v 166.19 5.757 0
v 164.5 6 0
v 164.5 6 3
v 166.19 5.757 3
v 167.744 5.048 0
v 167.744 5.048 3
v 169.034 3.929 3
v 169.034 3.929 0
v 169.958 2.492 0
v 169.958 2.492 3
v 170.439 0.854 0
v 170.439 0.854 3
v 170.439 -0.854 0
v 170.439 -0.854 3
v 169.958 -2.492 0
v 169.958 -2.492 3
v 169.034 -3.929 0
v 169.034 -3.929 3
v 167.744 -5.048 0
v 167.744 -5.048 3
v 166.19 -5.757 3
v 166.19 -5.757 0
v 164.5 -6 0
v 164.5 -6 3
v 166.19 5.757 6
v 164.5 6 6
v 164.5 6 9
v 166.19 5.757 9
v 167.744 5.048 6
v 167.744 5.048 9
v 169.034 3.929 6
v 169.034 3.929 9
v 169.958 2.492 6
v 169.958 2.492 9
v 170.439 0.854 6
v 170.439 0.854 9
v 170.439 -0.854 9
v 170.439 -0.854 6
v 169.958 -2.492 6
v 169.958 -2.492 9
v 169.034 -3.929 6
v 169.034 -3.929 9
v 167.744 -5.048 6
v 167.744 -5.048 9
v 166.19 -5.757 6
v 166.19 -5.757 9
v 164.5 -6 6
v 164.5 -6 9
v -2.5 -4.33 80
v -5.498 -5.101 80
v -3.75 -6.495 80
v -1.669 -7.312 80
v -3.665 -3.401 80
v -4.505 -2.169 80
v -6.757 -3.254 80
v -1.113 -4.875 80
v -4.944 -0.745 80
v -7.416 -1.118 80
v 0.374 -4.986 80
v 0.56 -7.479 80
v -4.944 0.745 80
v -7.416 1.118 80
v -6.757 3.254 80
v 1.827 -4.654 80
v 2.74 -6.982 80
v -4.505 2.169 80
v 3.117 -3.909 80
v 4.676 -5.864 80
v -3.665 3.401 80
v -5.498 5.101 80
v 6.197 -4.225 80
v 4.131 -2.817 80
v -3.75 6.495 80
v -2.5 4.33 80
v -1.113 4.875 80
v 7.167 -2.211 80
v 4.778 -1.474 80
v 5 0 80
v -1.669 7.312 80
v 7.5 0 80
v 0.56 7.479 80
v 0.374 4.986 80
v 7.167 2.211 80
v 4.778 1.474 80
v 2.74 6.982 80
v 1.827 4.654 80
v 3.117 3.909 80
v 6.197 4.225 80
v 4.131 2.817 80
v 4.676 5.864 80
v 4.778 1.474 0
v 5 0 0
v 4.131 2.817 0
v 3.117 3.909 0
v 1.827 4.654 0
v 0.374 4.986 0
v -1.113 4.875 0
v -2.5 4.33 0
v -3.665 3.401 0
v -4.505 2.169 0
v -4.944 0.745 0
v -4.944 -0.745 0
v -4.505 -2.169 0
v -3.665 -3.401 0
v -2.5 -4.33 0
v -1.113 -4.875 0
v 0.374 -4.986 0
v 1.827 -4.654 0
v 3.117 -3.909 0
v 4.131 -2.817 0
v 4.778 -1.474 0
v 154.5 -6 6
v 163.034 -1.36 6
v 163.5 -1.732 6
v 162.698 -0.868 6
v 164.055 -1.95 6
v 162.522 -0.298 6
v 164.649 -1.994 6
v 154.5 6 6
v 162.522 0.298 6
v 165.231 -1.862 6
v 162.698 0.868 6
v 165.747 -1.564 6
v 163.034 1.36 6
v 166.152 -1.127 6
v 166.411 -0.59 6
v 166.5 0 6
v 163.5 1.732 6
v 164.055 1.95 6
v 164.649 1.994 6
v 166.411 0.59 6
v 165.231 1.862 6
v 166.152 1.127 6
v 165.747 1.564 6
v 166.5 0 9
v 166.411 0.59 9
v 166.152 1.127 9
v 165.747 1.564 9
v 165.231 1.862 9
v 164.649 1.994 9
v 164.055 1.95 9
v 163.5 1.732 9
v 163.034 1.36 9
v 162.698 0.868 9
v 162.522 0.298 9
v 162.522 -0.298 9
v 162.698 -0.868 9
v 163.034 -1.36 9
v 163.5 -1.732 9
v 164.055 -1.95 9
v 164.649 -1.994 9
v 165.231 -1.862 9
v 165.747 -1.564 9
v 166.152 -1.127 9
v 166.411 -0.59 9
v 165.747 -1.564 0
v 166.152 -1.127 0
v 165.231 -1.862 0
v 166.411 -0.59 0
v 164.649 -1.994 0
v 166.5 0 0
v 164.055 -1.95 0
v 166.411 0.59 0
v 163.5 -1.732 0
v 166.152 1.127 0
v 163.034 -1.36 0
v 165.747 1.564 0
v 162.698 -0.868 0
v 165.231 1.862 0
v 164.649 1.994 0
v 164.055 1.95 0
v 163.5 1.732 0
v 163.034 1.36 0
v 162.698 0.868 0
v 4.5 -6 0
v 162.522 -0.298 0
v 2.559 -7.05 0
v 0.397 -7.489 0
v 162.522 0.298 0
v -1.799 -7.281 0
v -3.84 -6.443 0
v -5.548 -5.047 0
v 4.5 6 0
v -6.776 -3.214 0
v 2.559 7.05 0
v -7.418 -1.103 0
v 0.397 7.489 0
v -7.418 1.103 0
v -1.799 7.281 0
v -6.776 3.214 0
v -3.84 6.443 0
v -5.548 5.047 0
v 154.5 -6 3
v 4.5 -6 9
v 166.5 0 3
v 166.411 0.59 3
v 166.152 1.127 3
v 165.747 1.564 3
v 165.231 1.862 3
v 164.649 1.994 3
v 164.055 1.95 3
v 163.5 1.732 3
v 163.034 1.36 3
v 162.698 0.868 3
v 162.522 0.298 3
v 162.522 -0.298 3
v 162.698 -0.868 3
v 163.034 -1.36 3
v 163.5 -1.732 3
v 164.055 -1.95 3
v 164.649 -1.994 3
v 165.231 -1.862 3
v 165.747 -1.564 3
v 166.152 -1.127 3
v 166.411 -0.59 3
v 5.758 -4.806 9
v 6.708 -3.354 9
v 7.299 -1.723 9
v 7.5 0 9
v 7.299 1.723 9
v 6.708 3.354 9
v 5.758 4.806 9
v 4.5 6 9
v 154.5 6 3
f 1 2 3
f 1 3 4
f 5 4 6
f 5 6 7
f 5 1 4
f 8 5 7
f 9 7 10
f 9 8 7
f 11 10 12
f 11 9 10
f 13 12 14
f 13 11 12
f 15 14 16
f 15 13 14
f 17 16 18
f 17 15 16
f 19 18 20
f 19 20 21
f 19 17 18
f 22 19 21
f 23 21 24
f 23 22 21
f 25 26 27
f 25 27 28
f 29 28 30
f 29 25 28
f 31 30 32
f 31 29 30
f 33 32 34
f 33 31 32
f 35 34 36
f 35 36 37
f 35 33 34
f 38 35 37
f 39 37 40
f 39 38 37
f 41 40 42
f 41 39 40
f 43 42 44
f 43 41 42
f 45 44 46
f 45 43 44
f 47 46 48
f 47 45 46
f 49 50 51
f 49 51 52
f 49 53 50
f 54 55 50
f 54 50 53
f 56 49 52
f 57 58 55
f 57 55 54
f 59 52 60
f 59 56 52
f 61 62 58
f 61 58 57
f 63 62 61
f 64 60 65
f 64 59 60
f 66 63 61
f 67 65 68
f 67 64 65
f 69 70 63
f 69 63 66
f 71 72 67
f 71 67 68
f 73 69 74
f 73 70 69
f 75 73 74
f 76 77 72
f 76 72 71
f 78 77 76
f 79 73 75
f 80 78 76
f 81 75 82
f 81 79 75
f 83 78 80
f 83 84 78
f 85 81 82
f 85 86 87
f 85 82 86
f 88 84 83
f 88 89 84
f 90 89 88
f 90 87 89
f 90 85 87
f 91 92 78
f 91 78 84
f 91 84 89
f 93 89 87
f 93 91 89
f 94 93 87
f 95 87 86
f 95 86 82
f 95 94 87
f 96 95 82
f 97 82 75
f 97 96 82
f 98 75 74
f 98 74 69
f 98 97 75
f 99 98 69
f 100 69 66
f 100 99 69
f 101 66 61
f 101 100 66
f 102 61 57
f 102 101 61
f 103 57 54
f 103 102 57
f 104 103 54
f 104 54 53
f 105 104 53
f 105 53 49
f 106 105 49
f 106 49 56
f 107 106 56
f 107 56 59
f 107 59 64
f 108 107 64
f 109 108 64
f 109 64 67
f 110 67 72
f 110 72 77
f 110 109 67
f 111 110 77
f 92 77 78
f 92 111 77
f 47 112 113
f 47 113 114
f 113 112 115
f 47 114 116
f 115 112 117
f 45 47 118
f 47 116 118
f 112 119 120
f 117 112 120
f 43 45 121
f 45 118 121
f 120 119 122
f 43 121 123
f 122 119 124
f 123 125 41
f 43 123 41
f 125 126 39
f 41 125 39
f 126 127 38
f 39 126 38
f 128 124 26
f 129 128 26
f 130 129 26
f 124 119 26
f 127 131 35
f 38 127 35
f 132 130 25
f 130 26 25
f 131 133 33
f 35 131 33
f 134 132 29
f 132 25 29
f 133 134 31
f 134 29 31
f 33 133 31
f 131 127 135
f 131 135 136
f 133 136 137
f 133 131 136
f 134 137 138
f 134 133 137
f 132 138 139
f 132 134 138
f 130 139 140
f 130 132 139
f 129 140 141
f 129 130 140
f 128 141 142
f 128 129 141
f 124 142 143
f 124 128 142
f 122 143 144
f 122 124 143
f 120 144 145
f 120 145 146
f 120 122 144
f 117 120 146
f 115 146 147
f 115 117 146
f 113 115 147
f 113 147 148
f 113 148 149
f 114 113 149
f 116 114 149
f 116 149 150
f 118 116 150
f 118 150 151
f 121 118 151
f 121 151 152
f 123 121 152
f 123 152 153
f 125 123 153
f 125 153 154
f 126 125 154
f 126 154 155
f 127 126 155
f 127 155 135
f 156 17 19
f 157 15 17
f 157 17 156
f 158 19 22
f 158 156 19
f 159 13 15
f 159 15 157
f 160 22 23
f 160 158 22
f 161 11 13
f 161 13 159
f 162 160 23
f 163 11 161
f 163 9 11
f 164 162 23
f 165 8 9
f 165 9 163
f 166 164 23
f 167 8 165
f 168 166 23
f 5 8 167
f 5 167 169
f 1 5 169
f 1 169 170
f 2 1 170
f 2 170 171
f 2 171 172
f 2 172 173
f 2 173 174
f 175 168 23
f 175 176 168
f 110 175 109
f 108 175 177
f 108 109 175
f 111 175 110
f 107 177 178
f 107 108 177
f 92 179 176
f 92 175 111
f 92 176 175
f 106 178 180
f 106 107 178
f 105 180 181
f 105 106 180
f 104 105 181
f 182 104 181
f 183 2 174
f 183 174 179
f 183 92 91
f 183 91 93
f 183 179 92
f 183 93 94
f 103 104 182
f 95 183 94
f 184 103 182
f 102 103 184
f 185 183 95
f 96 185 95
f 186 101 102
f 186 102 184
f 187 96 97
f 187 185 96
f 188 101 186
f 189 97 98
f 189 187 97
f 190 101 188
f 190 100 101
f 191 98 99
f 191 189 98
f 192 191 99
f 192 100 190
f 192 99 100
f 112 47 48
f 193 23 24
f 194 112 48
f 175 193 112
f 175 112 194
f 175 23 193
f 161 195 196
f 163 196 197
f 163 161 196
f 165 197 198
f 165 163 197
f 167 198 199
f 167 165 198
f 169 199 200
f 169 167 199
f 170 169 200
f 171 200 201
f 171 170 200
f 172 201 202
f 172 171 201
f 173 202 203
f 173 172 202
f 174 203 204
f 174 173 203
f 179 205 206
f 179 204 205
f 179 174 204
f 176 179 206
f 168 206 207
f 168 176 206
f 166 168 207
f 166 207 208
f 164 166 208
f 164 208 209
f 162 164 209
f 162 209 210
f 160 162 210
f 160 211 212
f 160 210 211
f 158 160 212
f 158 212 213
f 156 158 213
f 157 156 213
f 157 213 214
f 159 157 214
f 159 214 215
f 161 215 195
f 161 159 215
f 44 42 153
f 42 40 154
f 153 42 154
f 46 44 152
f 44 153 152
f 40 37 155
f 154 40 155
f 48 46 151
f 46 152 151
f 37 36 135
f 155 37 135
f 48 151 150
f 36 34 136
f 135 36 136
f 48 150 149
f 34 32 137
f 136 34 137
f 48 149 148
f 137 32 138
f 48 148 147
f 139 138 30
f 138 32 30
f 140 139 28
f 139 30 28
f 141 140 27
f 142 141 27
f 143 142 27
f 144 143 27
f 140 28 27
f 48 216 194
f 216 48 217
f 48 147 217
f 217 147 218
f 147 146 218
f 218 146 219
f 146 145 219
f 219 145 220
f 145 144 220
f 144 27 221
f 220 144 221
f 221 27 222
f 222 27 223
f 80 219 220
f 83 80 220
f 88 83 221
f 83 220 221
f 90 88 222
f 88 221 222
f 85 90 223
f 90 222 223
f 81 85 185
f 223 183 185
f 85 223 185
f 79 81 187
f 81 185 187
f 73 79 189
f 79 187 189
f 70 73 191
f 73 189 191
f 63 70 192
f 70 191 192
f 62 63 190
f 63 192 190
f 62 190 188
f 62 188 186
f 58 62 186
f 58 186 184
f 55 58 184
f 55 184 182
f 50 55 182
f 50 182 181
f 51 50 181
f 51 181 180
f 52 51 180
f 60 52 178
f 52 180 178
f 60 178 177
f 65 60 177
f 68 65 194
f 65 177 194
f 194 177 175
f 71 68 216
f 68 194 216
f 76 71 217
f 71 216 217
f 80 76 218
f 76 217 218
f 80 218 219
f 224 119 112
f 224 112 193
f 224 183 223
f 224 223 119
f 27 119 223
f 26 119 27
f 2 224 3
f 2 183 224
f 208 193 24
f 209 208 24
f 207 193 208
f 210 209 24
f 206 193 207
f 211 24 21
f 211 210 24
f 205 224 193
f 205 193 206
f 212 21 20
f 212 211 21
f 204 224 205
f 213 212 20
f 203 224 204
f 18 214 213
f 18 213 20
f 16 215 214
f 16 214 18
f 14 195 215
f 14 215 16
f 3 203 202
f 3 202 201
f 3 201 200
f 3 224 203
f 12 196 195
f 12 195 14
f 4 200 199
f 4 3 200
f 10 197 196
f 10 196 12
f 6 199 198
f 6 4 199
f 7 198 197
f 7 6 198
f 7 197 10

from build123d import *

# Parameters (mm, degrees)
SKETCH_1_R          = 7.5
SKETCH_1_R_2        = 5
EXTRUDE_1_DEPTH     = 80
EXTRUDE_START       = -9
SKETCH_2_R          = 2
EXTRUDE_2_DEPTH     = 9
SKETCH_4_W          = 20
SKETCH_4_H          = 3
CUT_EXTRUDE_1_DEPTH = 20


with BuildPart() as part:
    # 草图1 → 凸台-拉伸1 (new body)
    with BuildSketch(Plane.XY):
        Circle(SKETCH_1_R)
        Circle(SKETCH_1_R_2, mode=Mode.SUBTRACT)
    extrude(amount=EXTRUDE_1_DEPTH)

    # 草图2 → 凸台-拉伸2 (add)
    with BuildSketch(Plane.XY.offset(9).offset(EXTRUDE_START)):
        with BuildLine():
            Line((164.5, -6), (4.5, -6))
            ThreePointArc((4.5, -6), (7.5, 0), (4.5, 6))
            Line((4.5, 6), (164.5, 6))
            ThreePointArc((164.5, 6), (170.5, 0), (164.5, -6))
        make_face()
        with Locations((164.5, 0)):
            Circle(SKETCH_2_R, mode=Mode.SUBTRACT)
    extrude(amount=EXTRUDE_2_DEPTH)

    # 草图4 → 切除-拉伸1 (cut)
    with BuildSketch(Plane(origin=(0, 6, 0), x_dir=(1, 0, 0), z_dir=(0, 1, 0))):
        with Locations((164.5, -4.5)):
            Rectangle(SKETCH_4_W, SKETCH_4_H)
    extrude(amount=-CUT_EXTRUDE_1_DEPTH, mode=Mode.SUBTRACT)


solid = part.part
